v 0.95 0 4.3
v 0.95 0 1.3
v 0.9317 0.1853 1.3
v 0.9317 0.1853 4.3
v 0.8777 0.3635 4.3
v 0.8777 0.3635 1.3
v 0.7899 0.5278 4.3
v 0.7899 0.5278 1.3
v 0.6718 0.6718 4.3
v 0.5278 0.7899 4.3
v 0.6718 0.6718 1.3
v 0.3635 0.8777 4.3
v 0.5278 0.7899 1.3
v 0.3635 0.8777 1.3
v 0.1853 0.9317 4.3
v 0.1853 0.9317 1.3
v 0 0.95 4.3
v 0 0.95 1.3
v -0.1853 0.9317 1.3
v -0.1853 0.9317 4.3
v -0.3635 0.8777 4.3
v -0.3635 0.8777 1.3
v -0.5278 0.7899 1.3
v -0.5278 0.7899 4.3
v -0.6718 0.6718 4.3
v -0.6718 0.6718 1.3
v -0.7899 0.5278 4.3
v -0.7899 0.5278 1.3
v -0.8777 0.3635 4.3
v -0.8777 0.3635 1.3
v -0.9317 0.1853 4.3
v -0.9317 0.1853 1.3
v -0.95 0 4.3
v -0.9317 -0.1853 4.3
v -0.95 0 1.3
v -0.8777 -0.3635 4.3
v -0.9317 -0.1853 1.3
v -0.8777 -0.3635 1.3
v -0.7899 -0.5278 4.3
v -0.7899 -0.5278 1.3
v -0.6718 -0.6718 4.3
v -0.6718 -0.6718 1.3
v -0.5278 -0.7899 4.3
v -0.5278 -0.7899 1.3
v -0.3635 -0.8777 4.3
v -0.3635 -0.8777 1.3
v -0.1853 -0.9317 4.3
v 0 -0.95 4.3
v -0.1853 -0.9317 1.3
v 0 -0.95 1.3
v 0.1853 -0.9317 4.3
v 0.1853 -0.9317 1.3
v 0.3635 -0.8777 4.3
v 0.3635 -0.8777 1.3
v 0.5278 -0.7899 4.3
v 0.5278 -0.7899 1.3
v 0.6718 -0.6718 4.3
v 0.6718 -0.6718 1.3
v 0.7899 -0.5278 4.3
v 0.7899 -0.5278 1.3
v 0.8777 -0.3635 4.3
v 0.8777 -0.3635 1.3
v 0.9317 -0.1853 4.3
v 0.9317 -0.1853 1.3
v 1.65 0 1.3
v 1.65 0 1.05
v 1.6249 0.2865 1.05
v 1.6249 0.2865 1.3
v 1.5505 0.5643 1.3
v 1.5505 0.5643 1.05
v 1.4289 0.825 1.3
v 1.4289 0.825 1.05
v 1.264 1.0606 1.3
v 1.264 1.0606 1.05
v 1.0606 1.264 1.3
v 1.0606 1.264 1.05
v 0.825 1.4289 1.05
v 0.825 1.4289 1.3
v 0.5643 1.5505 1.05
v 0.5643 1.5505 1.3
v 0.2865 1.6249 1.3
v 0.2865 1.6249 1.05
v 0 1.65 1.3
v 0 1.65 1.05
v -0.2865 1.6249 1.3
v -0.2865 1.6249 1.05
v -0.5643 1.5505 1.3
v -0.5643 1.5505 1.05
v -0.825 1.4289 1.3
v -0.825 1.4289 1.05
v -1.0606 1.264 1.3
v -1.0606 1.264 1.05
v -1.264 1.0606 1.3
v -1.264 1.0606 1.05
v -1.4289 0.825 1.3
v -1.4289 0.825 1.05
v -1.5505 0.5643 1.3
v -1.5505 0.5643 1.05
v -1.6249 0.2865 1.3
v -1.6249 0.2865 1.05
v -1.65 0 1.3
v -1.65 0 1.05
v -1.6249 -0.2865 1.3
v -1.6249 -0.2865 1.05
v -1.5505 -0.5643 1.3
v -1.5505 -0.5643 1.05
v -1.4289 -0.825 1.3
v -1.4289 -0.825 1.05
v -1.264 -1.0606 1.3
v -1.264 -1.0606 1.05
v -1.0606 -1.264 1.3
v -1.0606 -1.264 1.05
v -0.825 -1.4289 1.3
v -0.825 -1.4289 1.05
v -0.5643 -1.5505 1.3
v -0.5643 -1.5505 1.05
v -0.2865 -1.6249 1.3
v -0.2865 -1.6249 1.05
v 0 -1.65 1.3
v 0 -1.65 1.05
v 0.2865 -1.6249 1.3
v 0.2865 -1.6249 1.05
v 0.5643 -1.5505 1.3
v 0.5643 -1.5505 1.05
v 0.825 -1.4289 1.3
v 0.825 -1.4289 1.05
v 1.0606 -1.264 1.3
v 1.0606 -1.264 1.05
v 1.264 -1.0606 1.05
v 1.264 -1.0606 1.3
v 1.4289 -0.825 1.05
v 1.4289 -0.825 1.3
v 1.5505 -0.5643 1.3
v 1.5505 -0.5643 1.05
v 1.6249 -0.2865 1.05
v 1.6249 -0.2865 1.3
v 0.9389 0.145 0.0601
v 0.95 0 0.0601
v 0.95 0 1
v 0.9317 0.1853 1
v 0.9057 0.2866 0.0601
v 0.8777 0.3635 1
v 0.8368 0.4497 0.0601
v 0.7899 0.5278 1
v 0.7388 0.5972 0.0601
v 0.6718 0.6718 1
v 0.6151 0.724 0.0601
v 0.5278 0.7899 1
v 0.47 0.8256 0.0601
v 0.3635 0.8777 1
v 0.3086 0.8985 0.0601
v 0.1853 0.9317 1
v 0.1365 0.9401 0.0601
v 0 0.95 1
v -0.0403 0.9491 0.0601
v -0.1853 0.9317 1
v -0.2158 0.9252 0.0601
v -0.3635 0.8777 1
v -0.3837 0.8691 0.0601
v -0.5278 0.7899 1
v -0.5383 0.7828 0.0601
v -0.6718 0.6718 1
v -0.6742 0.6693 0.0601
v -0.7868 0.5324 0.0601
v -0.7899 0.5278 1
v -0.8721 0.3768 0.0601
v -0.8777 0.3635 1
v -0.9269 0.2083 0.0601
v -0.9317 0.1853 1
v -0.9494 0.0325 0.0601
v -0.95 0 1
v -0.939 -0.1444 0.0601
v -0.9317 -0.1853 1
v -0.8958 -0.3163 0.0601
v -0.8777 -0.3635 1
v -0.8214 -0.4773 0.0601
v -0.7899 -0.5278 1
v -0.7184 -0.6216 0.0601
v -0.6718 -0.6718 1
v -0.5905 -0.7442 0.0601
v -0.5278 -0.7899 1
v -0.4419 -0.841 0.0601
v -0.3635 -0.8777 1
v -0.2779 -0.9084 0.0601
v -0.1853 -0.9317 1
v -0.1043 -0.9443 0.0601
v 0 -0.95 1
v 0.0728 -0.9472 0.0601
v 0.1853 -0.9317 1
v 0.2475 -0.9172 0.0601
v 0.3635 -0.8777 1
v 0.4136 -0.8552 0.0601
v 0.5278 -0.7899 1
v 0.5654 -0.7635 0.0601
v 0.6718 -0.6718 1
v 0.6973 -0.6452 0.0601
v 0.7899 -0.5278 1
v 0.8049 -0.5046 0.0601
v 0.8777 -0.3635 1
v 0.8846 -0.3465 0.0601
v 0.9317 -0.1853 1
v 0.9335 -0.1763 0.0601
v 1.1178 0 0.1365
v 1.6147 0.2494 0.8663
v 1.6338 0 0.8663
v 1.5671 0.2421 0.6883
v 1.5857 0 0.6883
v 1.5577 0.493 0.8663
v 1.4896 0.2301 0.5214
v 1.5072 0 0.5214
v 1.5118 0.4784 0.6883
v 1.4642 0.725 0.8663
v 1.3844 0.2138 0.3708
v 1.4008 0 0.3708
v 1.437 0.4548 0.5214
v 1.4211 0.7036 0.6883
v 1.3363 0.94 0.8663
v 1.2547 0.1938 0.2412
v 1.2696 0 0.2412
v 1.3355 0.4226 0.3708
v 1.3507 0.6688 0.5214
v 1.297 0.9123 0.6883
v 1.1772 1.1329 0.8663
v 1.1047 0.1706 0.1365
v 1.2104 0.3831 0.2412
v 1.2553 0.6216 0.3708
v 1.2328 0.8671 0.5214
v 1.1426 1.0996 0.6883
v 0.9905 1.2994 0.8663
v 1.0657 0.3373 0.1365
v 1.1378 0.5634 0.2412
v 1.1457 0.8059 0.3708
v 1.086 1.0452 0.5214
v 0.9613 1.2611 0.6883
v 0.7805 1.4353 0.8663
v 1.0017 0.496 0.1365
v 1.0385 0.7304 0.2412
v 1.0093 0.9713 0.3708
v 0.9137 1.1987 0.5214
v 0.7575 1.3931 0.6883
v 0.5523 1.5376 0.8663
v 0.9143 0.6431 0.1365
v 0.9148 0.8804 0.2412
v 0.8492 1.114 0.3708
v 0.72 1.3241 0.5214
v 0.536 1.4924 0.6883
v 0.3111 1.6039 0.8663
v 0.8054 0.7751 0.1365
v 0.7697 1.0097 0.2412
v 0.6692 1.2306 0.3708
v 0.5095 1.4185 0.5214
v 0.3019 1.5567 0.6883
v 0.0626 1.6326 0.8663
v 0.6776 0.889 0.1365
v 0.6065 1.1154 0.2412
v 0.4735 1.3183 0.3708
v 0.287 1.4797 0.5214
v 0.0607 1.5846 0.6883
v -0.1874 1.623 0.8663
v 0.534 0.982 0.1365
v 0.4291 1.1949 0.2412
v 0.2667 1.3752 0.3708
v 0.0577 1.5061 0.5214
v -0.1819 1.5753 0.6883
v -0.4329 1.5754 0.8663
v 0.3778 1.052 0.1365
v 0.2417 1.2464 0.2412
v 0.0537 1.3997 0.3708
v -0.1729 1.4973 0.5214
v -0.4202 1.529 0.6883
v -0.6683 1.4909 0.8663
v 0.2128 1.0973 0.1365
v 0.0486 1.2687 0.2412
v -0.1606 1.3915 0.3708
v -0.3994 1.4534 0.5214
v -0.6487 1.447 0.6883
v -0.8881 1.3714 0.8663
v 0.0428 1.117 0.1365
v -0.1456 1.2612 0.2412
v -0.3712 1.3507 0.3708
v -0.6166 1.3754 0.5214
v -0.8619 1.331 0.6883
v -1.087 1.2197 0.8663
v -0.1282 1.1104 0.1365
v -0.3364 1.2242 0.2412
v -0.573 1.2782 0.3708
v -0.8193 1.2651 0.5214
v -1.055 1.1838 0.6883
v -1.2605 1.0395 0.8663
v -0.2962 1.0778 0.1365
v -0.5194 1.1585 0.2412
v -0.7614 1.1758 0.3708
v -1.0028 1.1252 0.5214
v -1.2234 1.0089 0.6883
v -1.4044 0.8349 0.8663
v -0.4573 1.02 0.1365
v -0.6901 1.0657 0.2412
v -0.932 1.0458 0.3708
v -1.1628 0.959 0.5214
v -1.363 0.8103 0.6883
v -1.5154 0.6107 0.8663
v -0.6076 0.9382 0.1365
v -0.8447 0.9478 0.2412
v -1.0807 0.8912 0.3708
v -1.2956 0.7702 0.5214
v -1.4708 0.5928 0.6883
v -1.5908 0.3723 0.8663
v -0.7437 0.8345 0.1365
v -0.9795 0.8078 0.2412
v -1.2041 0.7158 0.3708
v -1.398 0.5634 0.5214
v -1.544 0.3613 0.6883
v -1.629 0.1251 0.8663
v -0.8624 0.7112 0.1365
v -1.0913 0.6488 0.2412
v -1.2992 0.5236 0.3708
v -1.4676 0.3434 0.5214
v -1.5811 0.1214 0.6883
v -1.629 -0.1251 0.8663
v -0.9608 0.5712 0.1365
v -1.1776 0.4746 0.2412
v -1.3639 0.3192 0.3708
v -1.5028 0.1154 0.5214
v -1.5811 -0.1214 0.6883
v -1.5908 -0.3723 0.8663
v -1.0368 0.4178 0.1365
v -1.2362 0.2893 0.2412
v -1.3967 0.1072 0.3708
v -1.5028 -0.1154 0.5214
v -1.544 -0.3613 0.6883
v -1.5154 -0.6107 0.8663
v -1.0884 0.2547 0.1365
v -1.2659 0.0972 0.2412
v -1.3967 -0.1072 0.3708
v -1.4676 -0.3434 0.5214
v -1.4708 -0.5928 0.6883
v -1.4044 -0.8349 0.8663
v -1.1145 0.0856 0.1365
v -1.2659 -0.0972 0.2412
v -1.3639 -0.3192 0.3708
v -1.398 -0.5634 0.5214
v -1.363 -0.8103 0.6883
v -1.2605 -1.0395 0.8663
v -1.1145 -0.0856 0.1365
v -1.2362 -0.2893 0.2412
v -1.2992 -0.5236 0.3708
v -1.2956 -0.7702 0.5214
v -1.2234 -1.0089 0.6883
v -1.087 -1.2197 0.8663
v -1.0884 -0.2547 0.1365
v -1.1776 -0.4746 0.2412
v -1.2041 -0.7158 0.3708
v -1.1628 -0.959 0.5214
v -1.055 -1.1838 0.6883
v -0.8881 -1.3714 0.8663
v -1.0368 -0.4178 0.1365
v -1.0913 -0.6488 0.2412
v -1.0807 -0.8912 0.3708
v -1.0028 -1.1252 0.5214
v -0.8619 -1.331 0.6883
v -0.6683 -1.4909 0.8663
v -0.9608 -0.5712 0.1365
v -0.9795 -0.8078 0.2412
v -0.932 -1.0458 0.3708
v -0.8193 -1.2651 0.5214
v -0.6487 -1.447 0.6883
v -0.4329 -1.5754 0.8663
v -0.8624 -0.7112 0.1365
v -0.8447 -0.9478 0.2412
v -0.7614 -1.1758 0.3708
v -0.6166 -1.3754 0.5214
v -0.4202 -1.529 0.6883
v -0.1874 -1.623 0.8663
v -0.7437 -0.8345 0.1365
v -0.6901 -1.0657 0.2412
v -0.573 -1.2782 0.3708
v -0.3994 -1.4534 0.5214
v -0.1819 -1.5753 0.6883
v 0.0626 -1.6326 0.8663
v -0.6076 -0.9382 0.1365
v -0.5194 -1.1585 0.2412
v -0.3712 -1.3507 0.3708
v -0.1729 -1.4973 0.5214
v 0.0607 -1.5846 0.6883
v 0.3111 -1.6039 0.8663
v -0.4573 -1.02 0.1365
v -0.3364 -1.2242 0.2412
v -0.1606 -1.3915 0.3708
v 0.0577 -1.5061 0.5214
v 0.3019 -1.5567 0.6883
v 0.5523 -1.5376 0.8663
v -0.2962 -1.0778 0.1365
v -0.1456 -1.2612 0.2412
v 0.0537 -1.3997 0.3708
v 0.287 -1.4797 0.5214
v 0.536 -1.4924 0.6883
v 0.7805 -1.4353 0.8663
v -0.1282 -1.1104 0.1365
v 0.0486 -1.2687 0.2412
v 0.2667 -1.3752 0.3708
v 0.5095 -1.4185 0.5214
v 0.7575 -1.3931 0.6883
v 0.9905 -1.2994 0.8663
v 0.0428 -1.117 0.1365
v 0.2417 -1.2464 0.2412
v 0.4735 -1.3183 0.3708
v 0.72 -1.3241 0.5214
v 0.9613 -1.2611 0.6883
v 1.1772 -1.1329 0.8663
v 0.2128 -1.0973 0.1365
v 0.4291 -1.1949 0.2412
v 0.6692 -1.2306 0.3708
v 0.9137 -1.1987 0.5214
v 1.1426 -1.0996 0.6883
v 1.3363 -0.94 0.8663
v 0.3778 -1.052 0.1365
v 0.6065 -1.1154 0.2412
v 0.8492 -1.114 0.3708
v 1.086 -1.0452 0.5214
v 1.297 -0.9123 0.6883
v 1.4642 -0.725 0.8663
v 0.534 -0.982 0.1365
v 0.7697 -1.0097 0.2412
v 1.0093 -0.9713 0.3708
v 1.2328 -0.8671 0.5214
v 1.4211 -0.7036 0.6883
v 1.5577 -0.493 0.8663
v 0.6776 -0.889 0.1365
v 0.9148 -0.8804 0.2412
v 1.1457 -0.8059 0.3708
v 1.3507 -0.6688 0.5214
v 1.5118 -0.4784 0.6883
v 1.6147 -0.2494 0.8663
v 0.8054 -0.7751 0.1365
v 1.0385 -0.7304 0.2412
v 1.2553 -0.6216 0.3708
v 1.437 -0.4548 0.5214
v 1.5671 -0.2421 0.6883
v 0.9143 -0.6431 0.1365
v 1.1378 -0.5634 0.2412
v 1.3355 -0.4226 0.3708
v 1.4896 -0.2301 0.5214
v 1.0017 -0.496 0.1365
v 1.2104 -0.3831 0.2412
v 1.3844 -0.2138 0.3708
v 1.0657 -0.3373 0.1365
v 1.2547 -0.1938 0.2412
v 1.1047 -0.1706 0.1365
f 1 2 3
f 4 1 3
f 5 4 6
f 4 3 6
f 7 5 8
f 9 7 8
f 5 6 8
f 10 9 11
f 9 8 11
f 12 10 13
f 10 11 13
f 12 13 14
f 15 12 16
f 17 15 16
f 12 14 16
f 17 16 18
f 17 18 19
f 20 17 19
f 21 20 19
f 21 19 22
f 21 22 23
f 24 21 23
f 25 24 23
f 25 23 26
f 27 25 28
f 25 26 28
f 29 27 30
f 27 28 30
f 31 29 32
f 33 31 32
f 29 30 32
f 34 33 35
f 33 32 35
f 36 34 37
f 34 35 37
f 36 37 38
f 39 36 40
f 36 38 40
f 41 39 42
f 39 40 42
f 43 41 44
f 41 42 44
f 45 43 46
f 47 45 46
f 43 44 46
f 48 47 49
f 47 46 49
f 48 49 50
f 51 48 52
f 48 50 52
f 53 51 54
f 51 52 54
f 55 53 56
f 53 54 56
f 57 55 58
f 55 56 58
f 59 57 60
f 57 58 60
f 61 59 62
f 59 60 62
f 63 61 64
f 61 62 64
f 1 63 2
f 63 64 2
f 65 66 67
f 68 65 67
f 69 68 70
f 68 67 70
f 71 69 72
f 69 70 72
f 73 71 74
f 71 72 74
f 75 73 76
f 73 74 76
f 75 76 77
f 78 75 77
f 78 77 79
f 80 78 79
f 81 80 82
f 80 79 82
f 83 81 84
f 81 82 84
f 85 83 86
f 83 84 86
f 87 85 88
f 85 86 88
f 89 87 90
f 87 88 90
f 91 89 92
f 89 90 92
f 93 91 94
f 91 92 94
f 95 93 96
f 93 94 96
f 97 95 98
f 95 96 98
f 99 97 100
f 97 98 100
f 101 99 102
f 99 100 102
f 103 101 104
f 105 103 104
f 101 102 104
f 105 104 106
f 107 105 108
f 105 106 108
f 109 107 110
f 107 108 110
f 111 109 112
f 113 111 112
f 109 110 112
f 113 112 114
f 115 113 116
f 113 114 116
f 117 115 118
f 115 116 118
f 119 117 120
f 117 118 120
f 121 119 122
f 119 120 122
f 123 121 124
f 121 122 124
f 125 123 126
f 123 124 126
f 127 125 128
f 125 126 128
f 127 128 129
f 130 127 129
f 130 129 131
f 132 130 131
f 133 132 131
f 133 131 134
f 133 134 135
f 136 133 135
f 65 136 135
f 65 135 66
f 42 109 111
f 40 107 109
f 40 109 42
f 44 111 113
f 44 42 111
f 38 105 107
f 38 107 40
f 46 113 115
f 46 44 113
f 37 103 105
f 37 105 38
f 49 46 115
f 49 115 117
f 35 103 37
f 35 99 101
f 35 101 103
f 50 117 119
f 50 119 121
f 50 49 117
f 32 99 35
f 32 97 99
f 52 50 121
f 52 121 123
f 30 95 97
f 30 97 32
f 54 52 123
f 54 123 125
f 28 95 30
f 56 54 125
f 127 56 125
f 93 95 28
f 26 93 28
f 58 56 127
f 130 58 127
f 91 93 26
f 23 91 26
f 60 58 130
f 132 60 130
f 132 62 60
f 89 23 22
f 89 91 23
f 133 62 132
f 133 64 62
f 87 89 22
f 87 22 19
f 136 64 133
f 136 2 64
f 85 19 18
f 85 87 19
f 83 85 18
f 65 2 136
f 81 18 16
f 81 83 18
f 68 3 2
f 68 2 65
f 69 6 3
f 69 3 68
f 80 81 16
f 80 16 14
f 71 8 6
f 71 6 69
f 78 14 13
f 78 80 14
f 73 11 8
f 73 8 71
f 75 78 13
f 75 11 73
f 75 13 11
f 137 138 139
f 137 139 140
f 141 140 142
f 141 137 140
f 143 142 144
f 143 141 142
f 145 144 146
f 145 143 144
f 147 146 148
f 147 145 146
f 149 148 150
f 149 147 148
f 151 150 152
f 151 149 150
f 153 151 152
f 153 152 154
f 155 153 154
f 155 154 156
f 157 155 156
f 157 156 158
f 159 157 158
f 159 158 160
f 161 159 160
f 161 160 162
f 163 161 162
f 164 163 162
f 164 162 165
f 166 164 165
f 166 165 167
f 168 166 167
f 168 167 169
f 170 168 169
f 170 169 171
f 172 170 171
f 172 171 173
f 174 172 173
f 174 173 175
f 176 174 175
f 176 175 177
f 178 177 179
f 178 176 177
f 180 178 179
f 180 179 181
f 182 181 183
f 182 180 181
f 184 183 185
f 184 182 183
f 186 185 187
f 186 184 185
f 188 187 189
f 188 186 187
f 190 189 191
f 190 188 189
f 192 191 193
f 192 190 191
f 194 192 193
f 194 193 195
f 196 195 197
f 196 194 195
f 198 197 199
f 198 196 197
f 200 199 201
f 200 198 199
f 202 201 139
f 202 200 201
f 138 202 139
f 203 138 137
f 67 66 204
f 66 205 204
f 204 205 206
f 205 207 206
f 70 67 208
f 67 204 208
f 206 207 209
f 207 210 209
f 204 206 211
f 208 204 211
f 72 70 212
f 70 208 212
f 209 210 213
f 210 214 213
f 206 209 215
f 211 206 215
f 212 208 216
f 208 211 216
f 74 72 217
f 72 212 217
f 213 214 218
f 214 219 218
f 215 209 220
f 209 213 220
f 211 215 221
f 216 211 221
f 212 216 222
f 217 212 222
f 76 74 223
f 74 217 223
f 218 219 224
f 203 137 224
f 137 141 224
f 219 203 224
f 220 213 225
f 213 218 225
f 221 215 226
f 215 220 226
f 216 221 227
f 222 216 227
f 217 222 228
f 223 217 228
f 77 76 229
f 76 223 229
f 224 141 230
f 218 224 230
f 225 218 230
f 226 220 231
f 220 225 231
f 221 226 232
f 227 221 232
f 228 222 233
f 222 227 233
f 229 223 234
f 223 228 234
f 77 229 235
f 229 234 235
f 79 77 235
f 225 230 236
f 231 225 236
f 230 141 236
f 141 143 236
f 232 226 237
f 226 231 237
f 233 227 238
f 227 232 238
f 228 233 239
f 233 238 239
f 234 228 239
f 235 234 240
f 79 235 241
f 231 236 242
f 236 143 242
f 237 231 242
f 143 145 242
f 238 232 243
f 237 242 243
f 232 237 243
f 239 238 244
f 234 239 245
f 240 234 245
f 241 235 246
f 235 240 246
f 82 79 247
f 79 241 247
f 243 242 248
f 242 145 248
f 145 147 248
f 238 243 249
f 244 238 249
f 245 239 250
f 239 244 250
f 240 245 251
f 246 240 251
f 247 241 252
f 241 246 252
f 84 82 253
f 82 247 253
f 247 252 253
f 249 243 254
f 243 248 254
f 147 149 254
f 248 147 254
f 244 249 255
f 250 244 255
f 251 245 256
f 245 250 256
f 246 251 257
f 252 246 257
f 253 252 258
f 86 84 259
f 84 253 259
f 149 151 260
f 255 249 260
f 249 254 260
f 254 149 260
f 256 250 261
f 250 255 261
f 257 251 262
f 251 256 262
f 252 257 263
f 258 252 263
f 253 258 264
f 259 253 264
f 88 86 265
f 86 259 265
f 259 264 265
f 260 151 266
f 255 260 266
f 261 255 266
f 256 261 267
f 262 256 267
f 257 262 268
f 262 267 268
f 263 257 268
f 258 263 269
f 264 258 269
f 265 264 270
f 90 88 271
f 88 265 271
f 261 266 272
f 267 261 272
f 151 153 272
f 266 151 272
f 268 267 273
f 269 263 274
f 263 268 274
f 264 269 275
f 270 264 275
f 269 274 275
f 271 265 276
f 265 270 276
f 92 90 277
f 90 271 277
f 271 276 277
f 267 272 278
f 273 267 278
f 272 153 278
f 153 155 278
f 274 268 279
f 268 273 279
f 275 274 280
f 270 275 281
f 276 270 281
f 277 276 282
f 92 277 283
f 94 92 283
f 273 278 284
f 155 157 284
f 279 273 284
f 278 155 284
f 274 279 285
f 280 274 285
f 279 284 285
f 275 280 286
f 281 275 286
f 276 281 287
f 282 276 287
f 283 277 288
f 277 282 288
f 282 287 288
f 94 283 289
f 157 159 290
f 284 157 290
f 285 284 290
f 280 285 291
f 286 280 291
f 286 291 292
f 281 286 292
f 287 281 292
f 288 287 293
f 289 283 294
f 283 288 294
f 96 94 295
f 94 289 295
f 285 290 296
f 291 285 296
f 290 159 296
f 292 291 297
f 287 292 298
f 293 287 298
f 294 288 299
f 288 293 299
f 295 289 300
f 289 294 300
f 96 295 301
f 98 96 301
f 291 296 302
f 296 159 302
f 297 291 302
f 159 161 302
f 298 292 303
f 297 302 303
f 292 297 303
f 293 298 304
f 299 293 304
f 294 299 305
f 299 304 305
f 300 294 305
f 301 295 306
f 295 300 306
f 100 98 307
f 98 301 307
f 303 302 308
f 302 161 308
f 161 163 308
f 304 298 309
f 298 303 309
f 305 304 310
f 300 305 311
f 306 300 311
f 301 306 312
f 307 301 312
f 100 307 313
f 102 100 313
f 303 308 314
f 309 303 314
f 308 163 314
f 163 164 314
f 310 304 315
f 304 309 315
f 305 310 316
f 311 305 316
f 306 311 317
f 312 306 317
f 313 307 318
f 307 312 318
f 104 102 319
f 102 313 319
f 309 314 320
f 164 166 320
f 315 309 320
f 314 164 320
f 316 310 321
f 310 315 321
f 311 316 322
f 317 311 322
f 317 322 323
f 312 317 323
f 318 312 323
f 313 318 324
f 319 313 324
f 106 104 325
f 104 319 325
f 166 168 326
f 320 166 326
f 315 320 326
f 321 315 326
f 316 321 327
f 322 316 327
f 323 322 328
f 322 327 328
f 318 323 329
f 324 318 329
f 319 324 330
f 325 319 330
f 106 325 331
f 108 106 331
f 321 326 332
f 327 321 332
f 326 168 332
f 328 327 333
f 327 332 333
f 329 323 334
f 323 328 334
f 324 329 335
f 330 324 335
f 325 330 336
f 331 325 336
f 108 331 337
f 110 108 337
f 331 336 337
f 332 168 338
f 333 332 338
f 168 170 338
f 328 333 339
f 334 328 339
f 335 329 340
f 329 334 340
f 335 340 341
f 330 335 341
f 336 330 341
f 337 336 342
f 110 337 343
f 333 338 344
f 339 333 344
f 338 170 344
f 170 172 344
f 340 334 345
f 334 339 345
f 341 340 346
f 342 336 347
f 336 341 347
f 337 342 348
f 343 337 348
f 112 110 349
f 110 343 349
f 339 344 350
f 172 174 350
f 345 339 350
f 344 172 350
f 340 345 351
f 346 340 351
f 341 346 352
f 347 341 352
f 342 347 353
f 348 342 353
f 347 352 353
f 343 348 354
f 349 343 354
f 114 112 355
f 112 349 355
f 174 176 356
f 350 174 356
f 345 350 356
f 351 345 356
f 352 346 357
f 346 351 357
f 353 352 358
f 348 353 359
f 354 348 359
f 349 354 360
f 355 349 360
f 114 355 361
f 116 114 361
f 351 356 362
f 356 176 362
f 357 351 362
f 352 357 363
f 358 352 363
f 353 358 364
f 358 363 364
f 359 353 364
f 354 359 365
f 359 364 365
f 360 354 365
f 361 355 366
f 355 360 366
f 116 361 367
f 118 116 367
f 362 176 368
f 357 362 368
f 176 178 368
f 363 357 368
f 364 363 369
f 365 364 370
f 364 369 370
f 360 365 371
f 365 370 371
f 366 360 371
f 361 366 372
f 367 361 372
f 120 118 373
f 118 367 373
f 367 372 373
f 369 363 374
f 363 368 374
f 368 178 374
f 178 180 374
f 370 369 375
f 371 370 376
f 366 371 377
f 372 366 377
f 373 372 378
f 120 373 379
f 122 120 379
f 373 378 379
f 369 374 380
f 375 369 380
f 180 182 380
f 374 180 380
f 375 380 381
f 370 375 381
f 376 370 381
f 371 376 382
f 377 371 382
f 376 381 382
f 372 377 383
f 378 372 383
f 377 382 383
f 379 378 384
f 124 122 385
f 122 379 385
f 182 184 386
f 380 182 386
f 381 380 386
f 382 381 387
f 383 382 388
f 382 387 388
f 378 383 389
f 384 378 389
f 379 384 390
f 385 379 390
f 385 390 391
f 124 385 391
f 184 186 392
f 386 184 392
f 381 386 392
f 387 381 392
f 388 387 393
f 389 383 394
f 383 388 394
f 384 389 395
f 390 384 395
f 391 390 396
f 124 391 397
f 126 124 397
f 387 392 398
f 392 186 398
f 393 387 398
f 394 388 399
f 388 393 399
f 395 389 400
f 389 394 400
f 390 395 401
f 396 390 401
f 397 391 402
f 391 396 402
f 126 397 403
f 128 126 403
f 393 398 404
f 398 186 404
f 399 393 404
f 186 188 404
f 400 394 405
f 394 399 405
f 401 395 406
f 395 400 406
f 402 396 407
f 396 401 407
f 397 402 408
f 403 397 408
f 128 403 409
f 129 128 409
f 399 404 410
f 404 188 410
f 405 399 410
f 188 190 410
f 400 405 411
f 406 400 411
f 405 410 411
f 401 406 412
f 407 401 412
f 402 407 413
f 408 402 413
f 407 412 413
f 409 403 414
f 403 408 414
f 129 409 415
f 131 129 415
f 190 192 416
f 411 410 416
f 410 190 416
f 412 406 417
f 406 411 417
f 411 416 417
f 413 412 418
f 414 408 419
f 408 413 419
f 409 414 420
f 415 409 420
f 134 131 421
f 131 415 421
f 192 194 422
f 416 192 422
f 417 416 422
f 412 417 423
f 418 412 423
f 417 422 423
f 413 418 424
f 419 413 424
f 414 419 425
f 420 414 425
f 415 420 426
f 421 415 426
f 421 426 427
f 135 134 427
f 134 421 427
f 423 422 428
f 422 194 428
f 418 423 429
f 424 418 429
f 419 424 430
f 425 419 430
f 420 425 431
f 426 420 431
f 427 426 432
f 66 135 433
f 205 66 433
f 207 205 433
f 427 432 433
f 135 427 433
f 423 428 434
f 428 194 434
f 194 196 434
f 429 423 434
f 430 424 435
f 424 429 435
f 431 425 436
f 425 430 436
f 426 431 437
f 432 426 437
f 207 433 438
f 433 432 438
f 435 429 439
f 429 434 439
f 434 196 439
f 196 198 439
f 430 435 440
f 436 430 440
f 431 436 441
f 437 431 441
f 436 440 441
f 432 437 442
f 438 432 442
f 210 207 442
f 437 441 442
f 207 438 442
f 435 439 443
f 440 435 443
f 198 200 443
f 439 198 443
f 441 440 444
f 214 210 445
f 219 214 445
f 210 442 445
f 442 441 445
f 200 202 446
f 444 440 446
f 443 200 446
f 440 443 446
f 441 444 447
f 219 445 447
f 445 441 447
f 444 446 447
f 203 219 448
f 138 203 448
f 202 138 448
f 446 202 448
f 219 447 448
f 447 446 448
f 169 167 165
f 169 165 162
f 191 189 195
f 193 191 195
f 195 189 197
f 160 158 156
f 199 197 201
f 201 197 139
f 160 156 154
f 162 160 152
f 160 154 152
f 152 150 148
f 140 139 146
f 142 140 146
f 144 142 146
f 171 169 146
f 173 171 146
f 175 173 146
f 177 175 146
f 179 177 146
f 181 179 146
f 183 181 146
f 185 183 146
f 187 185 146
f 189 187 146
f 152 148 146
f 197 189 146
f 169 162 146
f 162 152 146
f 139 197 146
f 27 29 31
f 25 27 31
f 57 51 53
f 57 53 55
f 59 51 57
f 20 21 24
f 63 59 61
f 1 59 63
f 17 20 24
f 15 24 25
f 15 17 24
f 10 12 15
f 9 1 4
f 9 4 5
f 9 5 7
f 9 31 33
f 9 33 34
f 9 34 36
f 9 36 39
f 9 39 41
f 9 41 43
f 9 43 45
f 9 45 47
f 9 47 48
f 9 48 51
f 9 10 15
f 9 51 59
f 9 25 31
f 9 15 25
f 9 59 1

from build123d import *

# Parameters (mm, degrees)
SKETCH1_R           = 1.65
SKETCH1_R_2         = 0.95
BOSS_EXTRUDE1_DEPTH = 1.3
BOSS_EXTRUDE2_START = 1.3
SKETCH1_3_R         = 0.95
BOSS_EXTRUDE2_DEPTH = 3
FILLET1_R           = 1.05
SKETCH1_4_R         = 0.95
CUT_EXTRUDE1_DEPTH  = 1


with BuildPart() as part:
    # Sketch1 → Boss-Extrude1 (new body)
    with BuildSketch(Plane.XY):
        Circle(SKETCH1_R)
        Circle(SKETCH1_R_2, mode=Mode.SUBTRACT)
        Circle(SKETCH1_R_2)
    extrude(amount=BOSS_EXTRUDE1_DEPTH)

    # Sketch1<3> → Boss-Extrude2 (add)
    with BuildSketch(Plane.XY.offset(BOSS_EXTRUDE2_START)):
        Circle(SKETCH1_3_R)
    extrude(amount=BOSS_EXTRUDE2_DEPTH)

    # Fillet1
    fillet1_edges = [part.edges().sort_by_distance(p)[0] for p in [
        (-1.65, 0, 0),
    ]]
    fillet(fillet1_edges, radius=FILLET1_R)

    # Sketch1<4> → Cut-Extrude1 (cut)
    with BuildSketch(Plane.XY):
        Circle(SKETCH1_4_R)
    extrude(amount=CUT_EXTRUDE1_DEPTH, mode=Mode.SUBTRACT)


solid = part.part
